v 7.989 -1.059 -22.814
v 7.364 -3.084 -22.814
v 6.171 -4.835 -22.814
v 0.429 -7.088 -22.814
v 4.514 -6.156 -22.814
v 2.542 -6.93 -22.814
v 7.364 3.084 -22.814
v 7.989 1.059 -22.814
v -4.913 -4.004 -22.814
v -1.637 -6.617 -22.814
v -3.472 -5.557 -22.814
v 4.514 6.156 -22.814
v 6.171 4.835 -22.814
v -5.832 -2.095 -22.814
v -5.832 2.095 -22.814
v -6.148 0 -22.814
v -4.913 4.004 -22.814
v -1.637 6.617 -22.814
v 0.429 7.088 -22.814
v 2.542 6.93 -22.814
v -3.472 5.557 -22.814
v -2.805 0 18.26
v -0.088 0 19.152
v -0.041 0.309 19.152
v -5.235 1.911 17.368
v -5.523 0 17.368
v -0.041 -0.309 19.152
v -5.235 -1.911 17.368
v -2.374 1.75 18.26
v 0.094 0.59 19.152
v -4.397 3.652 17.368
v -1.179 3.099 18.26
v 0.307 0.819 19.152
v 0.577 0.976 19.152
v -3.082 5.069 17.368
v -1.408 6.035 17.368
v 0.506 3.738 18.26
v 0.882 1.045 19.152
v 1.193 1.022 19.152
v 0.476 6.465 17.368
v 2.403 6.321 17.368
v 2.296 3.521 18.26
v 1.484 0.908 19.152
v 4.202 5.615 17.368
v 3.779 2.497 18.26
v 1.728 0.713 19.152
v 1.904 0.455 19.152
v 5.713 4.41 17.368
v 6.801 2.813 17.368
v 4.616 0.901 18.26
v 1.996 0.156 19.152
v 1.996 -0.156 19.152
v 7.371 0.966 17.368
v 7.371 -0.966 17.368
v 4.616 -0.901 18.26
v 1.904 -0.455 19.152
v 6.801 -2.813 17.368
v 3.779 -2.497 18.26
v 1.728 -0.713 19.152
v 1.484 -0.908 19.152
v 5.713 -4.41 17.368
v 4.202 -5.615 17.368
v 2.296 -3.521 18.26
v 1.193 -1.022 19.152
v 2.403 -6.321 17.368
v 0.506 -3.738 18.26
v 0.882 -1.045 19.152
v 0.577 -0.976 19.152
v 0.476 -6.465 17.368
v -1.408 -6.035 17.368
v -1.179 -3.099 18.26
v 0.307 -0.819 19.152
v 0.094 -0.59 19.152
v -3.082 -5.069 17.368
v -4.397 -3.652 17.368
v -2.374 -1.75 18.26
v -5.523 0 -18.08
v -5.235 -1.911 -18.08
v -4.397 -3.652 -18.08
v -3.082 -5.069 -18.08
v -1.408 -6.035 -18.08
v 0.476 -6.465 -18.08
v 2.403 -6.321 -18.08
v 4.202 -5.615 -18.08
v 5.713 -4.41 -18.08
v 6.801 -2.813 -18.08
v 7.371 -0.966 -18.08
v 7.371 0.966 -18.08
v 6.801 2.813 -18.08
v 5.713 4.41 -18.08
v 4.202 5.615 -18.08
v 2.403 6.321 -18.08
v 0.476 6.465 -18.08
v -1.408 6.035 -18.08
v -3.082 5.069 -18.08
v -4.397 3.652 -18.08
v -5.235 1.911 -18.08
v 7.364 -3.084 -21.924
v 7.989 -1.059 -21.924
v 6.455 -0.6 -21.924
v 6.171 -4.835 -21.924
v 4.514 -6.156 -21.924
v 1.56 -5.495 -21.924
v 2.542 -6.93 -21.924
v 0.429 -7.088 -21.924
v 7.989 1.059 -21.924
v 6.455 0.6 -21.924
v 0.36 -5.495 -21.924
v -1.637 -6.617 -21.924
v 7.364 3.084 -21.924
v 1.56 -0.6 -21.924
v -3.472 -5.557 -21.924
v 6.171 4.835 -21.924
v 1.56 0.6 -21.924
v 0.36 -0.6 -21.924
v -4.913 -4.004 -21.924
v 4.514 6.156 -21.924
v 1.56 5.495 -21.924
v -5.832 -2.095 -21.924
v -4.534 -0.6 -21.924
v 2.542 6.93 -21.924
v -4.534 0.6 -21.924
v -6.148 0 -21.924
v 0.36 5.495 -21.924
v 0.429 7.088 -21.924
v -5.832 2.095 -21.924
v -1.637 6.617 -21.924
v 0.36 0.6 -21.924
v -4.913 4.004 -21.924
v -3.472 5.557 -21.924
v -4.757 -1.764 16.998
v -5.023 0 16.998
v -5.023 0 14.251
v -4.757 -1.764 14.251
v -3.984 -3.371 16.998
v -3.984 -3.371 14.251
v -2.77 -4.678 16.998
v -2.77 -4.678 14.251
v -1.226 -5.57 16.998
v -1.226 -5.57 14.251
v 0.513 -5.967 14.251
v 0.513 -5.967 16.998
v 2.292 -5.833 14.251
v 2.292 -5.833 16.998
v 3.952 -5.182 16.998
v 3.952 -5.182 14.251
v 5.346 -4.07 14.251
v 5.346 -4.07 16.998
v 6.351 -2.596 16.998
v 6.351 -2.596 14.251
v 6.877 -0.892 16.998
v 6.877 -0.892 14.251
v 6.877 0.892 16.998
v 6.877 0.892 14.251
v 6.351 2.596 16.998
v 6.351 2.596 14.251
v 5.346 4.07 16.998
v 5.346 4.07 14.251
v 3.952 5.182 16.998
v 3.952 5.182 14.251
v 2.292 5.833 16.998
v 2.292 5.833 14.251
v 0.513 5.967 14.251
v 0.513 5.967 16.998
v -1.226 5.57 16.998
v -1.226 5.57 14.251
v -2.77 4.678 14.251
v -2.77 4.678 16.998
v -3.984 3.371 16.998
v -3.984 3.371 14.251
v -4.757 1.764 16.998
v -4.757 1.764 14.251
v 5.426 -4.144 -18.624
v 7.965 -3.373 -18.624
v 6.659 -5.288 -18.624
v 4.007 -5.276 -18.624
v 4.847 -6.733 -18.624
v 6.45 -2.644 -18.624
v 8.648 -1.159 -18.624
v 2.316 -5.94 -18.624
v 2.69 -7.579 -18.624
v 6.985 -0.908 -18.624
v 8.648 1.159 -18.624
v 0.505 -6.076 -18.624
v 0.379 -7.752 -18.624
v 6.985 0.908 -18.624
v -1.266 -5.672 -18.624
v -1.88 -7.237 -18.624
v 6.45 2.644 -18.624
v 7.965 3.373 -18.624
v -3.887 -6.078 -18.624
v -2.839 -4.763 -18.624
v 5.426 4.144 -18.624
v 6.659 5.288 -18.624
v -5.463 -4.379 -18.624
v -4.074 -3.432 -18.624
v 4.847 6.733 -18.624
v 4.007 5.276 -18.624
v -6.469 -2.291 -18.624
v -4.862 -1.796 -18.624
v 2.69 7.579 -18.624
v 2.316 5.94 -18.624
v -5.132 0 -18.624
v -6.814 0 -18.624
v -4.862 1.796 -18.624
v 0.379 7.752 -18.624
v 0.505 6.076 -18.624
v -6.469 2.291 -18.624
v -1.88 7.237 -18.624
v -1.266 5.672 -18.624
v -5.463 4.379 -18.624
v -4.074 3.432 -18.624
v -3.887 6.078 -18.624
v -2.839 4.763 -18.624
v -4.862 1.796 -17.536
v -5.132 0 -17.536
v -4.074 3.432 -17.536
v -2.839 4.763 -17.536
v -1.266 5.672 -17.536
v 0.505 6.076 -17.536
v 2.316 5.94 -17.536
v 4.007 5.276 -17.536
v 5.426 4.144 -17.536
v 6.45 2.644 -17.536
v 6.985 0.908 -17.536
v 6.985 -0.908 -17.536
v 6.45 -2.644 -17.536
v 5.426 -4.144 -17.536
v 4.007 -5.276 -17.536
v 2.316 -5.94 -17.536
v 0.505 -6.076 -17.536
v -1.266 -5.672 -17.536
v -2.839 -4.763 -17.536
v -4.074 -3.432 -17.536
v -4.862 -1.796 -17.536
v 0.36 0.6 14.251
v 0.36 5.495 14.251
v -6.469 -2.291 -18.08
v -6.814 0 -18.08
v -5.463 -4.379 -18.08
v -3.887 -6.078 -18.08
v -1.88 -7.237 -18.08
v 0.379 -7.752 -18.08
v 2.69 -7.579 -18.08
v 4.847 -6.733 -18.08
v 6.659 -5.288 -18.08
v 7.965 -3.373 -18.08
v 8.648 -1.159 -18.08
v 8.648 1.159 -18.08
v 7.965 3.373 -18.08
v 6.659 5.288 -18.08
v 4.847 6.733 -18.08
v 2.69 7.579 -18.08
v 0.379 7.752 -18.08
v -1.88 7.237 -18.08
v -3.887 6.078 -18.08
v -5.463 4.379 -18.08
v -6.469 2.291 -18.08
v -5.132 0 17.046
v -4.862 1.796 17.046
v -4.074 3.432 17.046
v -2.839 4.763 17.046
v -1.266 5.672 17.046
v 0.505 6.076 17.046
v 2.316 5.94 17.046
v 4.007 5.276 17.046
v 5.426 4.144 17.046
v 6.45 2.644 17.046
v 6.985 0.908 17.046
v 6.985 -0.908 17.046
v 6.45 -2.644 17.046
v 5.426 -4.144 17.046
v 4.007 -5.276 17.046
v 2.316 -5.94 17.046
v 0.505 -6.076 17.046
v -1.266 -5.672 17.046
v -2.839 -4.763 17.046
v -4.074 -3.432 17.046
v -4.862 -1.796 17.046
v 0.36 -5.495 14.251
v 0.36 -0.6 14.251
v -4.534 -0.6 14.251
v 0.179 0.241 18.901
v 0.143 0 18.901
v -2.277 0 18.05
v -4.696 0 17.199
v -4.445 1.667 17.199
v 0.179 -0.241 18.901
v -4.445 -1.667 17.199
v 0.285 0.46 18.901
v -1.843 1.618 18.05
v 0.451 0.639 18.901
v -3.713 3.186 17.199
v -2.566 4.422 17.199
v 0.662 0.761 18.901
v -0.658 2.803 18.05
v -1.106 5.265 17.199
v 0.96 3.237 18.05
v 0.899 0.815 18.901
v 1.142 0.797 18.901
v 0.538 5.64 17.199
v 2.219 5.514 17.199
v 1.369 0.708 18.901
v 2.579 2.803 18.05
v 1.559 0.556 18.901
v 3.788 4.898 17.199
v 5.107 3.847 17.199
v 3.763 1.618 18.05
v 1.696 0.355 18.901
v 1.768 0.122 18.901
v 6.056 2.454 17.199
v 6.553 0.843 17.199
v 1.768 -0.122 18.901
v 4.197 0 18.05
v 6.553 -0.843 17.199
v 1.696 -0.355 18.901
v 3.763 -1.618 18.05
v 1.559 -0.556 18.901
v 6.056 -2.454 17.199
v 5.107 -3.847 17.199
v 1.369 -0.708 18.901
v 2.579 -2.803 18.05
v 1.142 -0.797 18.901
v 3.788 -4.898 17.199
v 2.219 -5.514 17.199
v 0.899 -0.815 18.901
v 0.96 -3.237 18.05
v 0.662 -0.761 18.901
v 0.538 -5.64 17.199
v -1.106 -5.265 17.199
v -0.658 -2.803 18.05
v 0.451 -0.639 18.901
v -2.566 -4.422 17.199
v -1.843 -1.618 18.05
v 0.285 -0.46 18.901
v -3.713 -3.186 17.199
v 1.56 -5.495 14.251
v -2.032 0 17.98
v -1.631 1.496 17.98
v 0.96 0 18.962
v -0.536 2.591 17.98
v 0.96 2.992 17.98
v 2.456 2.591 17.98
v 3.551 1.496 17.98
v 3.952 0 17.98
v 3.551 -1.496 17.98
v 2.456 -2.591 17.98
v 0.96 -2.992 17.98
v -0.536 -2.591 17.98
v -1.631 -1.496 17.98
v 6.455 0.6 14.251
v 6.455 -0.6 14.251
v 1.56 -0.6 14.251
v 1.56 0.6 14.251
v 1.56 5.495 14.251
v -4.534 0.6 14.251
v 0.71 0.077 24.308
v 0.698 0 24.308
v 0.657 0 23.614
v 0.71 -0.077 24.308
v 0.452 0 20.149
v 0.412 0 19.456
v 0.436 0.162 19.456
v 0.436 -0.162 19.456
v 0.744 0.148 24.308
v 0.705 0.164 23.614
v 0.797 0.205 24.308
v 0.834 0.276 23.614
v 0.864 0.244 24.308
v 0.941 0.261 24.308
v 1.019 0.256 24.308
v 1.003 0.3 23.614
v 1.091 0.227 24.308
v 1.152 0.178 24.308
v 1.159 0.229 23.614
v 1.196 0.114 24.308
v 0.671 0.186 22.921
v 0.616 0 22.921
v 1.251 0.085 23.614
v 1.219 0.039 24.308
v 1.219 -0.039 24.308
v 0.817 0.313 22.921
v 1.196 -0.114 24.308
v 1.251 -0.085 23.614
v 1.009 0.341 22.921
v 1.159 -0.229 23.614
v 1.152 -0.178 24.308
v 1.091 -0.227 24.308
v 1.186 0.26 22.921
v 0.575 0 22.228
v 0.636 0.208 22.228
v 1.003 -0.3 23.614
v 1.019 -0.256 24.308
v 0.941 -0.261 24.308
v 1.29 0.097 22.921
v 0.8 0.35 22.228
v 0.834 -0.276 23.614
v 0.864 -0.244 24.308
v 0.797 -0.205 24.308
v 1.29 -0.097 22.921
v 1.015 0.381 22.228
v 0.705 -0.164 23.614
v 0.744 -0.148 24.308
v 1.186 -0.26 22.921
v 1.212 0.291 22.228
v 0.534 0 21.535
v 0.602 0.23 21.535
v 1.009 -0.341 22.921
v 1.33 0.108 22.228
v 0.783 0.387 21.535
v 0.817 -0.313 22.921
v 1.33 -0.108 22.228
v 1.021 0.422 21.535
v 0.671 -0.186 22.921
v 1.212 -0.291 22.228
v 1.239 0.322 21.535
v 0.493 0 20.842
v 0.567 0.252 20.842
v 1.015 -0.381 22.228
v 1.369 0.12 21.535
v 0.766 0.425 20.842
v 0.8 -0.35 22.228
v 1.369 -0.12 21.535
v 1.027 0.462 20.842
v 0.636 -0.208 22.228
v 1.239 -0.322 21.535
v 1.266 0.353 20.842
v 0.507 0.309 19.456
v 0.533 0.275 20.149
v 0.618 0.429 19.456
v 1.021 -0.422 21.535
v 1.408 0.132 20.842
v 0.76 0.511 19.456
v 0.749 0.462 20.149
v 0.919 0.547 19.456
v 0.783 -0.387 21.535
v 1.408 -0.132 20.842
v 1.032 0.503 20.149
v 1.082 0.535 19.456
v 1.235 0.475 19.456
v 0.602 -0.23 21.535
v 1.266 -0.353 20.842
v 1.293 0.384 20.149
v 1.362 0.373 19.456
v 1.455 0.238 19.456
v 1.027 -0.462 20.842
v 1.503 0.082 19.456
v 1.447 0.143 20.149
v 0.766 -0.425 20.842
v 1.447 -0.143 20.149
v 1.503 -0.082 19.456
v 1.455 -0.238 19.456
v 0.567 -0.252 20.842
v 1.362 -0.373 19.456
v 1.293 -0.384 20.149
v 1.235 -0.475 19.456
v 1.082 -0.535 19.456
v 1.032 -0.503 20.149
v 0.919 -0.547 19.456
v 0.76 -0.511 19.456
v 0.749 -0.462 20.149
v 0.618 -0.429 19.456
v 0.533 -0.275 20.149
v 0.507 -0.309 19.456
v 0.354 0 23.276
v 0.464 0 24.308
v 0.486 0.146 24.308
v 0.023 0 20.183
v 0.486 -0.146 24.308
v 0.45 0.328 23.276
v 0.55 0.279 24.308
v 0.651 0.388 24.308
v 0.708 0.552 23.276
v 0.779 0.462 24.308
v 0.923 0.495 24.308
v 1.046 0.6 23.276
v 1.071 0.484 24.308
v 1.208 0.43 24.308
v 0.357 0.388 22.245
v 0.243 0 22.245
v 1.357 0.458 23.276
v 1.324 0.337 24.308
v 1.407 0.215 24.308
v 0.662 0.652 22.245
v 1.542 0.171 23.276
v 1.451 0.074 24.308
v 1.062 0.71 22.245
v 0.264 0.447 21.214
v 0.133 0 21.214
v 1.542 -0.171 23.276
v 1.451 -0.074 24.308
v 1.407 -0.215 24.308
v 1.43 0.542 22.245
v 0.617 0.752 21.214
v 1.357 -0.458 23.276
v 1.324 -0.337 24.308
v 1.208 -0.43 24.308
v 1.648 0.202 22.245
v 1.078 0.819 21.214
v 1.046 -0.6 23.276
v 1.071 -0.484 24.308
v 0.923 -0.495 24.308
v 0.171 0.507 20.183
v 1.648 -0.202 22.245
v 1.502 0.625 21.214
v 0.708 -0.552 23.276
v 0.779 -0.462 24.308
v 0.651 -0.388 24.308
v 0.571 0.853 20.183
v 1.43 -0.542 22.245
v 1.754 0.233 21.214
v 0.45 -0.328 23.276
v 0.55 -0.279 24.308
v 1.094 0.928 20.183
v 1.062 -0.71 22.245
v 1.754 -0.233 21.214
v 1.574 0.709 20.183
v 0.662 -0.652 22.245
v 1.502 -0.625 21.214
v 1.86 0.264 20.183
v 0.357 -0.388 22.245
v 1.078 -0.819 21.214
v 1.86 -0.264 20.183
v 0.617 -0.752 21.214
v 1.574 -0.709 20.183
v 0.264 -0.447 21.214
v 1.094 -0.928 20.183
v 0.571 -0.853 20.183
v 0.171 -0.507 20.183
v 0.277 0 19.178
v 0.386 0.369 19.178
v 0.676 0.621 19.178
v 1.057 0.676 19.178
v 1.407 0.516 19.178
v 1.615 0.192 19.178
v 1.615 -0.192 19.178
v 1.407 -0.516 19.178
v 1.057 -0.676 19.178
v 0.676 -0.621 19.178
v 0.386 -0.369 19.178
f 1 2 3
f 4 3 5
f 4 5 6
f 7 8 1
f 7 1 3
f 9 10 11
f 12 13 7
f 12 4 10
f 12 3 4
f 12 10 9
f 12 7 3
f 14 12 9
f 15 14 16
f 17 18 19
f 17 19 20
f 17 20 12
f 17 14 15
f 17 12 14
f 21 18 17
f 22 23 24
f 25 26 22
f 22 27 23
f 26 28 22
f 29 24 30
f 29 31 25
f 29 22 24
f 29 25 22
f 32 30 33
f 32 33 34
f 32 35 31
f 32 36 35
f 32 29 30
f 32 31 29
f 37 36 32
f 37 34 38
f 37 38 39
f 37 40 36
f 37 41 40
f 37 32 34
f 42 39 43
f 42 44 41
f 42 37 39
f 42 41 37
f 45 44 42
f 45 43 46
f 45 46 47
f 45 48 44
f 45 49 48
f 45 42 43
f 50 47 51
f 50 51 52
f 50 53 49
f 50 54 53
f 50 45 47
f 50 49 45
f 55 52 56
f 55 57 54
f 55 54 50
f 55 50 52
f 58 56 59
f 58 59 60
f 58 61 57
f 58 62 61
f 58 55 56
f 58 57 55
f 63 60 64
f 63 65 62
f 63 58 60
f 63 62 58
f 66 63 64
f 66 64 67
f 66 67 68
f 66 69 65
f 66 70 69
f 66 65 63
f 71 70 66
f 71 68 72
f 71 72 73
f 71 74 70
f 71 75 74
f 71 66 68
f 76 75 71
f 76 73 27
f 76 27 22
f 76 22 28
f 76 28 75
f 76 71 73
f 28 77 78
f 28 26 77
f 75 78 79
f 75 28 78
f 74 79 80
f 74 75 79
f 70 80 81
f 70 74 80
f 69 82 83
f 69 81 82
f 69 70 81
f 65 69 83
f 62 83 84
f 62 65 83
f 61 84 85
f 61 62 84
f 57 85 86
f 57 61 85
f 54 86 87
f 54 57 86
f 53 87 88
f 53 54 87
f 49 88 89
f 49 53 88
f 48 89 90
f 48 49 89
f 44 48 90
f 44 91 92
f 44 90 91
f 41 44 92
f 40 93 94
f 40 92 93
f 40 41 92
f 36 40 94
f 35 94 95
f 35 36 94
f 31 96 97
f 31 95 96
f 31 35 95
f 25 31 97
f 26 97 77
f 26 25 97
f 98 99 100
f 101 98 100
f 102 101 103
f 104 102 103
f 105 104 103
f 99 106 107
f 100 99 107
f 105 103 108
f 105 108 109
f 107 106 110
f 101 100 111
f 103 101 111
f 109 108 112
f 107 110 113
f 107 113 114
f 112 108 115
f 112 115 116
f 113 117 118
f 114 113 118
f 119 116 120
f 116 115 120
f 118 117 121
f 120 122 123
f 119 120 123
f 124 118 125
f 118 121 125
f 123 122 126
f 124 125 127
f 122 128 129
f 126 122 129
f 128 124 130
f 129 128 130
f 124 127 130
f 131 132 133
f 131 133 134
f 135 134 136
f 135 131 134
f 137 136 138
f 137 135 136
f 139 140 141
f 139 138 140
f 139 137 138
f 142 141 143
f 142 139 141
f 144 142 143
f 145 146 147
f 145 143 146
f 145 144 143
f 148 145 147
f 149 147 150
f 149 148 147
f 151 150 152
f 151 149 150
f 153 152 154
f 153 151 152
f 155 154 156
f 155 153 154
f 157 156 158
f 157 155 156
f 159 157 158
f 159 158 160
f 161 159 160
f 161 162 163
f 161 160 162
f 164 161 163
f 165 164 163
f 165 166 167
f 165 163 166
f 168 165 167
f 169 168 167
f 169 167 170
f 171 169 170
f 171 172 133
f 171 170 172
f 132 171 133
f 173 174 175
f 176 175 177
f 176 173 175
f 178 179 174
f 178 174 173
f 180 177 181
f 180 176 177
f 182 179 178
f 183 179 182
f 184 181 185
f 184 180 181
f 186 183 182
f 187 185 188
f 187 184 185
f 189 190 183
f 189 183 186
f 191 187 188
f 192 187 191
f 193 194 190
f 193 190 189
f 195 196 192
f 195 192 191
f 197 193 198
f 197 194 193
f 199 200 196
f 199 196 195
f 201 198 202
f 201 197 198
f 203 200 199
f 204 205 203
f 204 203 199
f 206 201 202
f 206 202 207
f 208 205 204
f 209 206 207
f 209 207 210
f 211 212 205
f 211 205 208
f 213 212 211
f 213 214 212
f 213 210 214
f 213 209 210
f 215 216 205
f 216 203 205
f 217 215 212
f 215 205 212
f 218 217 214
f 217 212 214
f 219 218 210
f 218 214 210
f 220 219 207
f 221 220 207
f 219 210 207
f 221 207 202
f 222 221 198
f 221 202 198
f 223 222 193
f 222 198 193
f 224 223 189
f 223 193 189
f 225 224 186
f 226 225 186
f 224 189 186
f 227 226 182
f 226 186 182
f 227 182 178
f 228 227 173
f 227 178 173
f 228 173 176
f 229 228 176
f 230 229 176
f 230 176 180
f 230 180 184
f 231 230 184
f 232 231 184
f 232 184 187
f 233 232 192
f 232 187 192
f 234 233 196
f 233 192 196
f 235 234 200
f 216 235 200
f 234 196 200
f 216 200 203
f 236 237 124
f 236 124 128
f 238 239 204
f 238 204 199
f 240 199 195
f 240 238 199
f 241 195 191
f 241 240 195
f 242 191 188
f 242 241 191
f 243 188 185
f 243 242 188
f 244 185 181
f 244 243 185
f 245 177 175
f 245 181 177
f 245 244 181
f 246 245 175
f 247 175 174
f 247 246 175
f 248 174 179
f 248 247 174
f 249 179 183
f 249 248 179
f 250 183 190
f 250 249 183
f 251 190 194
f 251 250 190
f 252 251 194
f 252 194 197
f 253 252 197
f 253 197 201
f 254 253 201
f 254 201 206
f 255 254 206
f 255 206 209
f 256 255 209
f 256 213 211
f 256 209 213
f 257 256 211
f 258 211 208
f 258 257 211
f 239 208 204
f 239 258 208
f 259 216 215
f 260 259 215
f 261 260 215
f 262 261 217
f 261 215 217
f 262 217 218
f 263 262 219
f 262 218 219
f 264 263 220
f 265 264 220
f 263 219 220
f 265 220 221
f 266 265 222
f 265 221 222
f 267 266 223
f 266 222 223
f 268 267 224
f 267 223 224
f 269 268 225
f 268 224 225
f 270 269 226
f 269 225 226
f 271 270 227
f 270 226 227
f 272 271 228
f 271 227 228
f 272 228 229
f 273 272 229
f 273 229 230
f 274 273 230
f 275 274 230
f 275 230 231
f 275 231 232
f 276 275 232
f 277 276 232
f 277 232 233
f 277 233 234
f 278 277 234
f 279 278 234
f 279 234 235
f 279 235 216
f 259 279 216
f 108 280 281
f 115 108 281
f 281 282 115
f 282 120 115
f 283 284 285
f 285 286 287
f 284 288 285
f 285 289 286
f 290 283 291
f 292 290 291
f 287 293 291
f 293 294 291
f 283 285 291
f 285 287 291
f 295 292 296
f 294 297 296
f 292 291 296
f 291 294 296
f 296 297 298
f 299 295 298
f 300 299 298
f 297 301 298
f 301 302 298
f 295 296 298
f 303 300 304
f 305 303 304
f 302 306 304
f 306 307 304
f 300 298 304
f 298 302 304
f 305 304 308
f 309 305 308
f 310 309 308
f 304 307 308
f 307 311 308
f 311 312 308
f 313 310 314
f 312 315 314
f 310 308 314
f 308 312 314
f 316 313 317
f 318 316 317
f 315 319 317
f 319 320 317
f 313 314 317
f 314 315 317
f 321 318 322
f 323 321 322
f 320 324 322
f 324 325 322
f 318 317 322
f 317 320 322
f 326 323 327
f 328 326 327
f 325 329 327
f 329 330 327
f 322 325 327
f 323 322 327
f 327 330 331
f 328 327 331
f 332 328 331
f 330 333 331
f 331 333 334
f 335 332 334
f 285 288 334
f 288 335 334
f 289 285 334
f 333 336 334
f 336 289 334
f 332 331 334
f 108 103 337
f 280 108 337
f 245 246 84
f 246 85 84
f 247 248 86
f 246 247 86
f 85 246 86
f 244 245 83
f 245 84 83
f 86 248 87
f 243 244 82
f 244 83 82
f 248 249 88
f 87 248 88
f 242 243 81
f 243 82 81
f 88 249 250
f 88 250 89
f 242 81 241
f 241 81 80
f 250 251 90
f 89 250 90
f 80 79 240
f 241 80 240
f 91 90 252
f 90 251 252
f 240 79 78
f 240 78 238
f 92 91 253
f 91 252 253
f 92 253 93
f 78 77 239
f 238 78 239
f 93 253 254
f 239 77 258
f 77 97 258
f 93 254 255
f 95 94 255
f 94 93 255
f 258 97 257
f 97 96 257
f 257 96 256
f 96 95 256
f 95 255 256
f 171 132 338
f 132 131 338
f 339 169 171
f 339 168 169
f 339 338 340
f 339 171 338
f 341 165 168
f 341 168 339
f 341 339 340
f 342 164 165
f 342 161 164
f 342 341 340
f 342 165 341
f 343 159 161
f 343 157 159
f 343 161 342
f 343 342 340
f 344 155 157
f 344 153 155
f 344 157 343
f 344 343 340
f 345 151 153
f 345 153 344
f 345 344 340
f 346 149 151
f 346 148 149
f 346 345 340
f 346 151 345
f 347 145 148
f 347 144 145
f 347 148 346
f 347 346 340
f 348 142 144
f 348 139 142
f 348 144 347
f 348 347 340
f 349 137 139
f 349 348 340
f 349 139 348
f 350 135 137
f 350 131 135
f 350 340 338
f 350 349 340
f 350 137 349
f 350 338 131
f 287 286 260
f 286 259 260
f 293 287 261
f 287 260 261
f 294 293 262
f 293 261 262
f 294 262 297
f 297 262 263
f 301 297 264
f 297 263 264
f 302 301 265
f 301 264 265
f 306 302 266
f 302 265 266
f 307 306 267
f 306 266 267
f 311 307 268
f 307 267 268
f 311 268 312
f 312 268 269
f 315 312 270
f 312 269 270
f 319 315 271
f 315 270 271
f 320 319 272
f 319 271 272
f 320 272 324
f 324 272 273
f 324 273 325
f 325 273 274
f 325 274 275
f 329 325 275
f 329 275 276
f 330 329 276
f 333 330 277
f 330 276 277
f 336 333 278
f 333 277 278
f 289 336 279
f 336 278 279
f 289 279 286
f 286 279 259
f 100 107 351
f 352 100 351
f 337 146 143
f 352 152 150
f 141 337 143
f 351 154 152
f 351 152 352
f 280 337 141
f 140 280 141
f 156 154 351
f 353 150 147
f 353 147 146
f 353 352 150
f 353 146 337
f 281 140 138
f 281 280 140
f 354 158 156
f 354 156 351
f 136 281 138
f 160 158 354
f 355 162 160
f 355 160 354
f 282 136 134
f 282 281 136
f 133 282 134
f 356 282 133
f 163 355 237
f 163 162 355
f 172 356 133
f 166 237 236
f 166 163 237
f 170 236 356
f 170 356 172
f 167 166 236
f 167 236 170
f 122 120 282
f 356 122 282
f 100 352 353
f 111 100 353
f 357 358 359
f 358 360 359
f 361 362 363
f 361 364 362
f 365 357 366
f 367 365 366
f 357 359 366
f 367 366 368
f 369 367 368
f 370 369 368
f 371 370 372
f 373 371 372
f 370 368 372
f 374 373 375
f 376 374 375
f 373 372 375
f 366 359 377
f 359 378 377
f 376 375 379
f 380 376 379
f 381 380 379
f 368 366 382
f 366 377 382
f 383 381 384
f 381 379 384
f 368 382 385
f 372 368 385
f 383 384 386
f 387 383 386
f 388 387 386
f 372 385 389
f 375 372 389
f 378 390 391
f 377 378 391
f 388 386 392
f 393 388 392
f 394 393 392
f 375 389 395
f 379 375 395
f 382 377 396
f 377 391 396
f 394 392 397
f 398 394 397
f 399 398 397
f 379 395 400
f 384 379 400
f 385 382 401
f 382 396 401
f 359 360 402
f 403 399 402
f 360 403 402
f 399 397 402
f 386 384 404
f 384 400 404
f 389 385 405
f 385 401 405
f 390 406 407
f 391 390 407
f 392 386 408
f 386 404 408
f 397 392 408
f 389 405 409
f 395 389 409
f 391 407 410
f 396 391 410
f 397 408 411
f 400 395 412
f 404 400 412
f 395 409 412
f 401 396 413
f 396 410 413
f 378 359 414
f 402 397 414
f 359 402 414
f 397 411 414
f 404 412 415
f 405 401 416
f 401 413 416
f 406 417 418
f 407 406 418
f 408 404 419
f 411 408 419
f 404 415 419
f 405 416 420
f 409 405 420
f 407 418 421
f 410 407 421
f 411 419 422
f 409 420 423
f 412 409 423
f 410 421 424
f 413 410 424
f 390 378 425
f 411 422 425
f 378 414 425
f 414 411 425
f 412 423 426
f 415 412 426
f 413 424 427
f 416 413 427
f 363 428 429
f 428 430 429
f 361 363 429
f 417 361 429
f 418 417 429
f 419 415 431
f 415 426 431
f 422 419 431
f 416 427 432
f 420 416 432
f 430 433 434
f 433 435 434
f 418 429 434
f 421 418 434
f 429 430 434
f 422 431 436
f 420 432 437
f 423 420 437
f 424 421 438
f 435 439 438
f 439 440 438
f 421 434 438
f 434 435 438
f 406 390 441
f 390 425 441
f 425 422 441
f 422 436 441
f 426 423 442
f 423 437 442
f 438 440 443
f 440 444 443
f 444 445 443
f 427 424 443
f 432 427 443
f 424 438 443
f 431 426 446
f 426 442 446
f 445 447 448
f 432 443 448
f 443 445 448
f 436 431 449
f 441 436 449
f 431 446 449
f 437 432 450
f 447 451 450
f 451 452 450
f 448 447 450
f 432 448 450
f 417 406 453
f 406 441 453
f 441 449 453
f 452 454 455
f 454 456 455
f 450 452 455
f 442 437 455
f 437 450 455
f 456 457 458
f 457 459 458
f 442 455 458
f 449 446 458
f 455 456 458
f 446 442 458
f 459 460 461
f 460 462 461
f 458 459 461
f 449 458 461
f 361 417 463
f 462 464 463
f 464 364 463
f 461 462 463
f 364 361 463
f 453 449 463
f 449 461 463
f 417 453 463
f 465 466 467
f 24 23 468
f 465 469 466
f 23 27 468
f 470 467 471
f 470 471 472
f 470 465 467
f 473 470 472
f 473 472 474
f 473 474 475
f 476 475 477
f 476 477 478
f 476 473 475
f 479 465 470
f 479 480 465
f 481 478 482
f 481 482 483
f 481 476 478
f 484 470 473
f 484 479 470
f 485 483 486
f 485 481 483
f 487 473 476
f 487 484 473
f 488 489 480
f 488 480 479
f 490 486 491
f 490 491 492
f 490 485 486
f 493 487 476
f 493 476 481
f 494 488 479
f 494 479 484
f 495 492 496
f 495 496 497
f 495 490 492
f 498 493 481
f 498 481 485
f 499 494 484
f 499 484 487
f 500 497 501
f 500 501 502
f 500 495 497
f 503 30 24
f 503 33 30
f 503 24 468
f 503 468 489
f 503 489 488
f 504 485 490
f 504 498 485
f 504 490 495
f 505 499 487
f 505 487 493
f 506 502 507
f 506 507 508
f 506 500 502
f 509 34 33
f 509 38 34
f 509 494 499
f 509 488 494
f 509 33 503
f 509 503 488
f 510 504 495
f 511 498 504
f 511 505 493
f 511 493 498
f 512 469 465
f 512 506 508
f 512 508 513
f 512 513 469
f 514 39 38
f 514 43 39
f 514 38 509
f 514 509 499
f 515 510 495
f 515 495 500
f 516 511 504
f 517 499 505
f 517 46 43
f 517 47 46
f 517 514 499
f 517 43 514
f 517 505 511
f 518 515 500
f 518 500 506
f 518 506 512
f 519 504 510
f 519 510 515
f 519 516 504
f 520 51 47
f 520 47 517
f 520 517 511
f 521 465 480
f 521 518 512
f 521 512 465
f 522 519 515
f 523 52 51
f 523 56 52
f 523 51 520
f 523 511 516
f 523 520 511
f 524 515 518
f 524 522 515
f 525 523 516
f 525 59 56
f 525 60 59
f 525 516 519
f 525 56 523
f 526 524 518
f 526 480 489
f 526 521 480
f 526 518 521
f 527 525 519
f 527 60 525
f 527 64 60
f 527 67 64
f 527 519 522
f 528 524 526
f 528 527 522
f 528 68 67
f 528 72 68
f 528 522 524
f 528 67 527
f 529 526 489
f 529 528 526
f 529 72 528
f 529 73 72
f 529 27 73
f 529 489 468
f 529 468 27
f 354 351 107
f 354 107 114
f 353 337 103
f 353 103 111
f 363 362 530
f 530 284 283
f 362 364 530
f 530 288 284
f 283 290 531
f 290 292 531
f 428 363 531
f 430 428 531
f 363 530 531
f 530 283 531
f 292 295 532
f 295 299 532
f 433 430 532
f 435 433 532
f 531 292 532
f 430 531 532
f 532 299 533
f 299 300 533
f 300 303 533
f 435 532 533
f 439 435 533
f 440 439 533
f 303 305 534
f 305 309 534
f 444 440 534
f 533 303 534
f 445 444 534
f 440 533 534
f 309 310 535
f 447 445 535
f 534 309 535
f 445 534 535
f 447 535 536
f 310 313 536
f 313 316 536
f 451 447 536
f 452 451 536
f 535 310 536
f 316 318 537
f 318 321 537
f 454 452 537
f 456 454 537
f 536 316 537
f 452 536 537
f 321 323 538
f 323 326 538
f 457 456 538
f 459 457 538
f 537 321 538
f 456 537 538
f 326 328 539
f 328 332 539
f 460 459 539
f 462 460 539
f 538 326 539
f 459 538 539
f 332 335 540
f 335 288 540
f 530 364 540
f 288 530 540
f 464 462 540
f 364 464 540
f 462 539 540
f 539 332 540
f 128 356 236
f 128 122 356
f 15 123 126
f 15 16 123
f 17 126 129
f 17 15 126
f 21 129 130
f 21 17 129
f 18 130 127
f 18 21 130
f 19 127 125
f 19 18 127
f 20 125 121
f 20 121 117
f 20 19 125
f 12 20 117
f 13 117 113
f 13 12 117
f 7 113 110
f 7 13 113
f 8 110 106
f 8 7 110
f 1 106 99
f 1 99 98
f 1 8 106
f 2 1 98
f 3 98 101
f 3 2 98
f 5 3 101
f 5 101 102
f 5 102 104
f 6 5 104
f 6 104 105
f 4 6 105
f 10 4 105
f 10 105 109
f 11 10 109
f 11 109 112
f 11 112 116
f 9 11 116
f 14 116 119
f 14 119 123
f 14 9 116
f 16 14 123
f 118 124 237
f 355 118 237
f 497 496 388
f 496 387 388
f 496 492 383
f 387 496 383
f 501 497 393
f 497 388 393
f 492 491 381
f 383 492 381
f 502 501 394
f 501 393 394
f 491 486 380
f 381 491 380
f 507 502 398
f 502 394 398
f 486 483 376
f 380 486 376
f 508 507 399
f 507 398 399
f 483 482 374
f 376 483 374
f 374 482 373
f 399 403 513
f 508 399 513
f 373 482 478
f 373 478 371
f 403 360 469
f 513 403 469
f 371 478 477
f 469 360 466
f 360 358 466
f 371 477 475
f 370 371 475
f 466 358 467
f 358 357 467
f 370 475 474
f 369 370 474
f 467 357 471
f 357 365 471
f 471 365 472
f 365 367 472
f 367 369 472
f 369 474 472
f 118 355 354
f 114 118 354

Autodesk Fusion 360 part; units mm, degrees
sketch "Sketch1" plane through (0, 0, 0) normal (0, 1, 0) x (1, 0, 0)
  line L0 (0.698, -24.3075) -> (0.4115, -19.4557)
  line L1 (0.4115, -19.4557) -> (0.143, -18.9007)
  line L2 (0.143, -18.9007) -> (-4.6961, -17.1992)
  line L3 (-4.6961, -17.1992) -> (-5.1325, -17.0457)
  line L4 (-5.1325, -17.0457) -> (-5.1325, 17.5365)
  line L5 (-5.1325, 17.5365) -> (-5.1325, 18.6235)
  line L6 (-5.1325, 18.6235) -> (-6.814, 18.6235)
  line L7 (-6.814, 18.6235) -> (-6.814, 18.08)
  line L8 (-6.814, 18.08) -> (-5.5231, 18.08)
  line L9 (-5.5231, 18.08) -> (-5.5231, -17.3685)
  line L10 (-5.5231, -17.3685) -> (-0.0878, -19.1519)
  line L11 (-0.0878, -19.1519) -> (0.4642, -24.3075)
  line L12 (0.4642, -24.3075) -> (0.698, -24.3075)
  line L13 (-5.0232, -16.9985) -> (0.9602, -18.9618)
  line L14 (0.9602, -18.9618) -> (0.9602, -14.2511)
  line L15 (0.9602, -14.2511) -> (-5.0232, -14.2511)
  line L16 (-5.0232, -14.2511) -> (-5.0232, -16.9985)
  line L17 (-4.5345, -14.2511) -> (0.9602, -14.2511)
  line L18 (0.9602, 21.9241) -> (-4.5345, 21.9241)
  line L19 (-4.5345, 21.9241) -> (-4.5345, -14.2511)
  line L20 (0.9602, -14.2511) -> (0.9602, 21.9241)
  line L21 (0.9602, 21.9241) -> (-6.1477, 21.9241)
  line L22 (-6.1477, 21.9241) -> (-6.1477, 22.8143)
  line L23 (-6.1477, 22.8143) -> (0.9602, 22.8143)
  line L24 (0.9602, 22.8143) -> (0.9602, 21.9241)
revolve "Revolve1" add sketch "Sketch1" angle 360 about axis through (0.9602, 0, 14.2511) along (0, 0, -1) contours L13 L14 L15 L16 L17 | L18 L21 L22 L23 L24 makes body 1 at (-1.3667, -4.0303, 17.4348) makes body 2 at (2.697, 0.2148, -21.9241)
extrude "Extrude1" add sketch "Sketch1" along normal blind 0.6 and the other way blind 0.6 separate body contours L15 L17 L18 L19 L20 L21 makes body 3
pattern_circular "C-Pattern1" count 4 over 360 about axis through (0.9602, 0, 14.2511) along (0, 0, -1) of bodies 3 makes body 4 at (1.5602, 3.6631, 2.1927) makes body 5 at (4.6233, -0.6, 2.1927) makes body 6 at (0.3602, -3.6631, 2.1927)
revolve "Revolve2" add sketch "Sketch1" angle 360 about axis through (0.9602, 0, 14.2511) along (0, 0, -1) separate body contours L0 L1 L2 L3 L4 L5 L6 L7 L8 L9 L10 L11 L12 makes body 7
sketch "Sketch2" plane through (0, 0, 0) normal (0, 1, 0) x (1, 0, 0)
combine "Combine1" operation add target body 1 tool bodies 2 3 4 5 6
